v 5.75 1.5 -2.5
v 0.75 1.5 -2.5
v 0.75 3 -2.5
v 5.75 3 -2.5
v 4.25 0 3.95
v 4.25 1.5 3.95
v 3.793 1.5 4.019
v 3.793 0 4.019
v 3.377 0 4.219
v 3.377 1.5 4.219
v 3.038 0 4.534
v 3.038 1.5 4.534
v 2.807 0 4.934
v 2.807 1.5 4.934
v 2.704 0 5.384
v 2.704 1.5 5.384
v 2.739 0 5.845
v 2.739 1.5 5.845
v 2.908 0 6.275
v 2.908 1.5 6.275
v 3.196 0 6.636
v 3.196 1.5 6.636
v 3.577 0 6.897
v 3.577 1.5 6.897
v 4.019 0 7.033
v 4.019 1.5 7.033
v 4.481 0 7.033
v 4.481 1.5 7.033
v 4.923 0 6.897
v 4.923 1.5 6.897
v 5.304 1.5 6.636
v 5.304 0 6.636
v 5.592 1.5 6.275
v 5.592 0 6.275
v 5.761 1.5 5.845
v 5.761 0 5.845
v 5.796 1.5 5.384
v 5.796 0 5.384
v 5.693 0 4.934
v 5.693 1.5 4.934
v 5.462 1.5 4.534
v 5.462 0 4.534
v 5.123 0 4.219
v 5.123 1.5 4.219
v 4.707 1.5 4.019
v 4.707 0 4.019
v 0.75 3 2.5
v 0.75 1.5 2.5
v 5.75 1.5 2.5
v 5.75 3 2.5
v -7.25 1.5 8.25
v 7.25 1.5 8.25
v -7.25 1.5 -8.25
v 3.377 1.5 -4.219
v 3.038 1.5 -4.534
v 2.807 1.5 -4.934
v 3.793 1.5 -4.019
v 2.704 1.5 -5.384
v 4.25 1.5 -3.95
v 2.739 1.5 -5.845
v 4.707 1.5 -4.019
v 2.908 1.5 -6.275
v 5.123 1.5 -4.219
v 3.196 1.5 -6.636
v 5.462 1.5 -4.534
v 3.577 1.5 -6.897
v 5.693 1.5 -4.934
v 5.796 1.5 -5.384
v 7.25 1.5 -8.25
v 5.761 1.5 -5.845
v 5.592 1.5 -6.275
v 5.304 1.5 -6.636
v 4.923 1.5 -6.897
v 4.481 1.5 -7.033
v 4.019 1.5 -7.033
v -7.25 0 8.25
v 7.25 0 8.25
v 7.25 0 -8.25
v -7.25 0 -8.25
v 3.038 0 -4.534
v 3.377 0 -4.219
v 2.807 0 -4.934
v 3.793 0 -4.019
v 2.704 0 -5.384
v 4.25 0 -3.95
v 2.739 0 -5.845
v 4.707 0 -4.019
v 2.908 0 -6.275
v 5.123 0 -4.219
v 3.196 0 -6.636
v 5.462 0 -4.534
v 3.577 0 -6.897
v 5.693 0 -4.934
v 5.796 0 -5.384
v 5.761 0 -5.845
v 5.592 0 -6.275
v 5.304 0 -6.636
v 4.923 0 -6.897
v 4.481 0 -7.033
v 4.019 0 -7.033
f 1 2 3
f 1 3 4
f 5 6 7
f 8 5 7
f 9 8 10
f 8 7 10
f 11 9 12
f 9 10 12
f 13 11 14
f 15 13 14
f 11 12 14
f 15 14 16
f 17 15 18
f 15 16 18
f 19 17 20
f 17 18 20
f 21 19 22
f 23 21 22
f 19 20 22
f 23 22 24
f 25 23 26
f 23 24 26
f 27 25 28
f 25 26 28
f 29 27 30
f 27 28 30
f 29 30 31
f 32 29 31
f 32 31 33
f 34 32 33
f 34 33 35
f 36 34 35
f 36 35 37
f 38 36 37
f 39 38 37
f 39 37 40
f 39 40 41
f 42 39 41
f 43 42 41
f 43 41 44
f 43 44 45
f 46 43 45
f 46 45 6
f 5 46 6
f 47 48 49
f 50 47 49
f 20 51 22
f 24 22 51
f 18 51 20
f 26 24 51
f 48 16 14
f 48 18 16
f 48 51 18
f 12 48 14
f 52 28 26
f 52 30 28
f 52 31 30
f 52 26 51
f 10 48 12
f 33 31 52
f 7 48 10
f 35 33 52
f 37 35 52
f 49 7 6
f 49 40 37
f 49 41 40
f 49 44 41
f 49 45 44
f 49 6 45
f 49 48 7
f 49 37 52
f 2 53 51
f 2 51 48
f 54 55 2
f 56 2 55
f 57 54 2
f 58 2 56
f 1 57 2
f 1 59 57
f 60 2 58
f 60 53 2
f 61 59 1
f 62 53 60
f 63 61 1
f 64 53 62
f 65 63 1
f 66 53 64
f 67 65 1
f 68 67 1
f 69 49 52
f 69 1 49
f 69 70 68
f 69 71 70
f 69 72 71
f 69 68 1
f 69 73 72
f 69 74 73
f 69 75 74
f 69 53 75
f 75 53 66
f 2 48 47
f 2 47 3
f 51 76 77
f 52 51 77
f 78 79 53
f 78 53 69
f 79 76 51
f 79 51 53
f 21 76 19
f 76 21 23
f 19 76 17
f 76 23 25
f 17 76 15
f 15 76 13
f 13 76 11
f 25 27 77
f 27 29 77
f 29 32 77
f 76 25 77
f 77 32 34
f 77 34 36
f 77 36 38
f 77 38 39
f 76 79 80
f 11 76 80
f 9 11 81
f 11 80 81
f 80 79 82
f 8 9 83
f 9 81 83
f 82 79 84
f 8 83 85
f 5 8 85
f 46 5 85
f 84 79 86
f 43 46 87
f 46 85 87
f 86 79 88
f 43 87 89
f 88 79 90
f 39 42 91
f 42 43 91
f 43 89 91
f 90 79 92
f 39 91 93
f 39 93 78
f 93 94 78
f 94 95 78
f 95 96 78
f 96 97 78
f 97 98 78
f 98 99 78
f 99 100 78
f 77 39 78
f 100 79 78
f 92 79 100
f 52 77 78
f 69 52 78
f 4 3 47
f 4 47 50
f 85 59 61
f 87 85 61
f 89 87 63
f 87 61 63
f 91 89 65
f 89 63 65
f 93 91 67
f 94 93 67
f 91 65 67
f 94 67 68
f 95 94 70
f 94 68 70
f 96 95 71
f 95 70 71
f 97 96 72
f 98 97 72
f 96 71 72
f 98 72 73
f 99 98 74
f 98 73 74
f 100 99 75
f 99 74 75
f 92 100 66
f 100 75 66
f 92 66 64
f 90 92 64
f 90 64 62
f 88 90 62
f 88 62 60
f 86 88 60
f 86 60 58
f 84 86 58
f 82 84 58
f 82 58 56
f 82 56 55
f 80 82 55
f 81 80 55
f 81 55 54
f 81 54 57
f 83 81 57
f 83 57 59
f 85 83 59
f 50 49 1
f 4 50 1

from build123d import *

# Parameters (mm, degrees)
SKETCH1_W           = 14.5
SKETCH1_H           = 16.5
BOSS_EXTRUDE1_DEPTH = 1.5
SKETCH2_R           = 1.55
CUT_EXTRUDE1_DEPTH  = 12.084899639
SKETCH3_W           = 5
SKETCH3_H           = 5
BOSS_EXTRUDE2_DEPTH = 1.5


with BuildPart() as part:
    # Sketch1 → Boss-Extrude1 (new body)
    with BuildSketch(Plane(origin=(0, 0, 0), x_dir=(1, 0, 0), z_dir=(0, 1, 0))):
        Rectangle(SKETCH1_W, SKETCH1_H)
    extrude(amount=BOSS_EXTRUDE1_DEPTH)

    # Sketch2 → Cut-Extrude1 (cut, through all)
    with BuildSketch(Plane(origin=(0, 1.5, 0), x_dir=(1, 0, 0), z_dir=(0, 1, 0))):
        with Locations(Location((4.25, 5.5, 0), (0, 0, 270))):
            Circle(SKETCH2_R)
        with Locations(Location((4.25, -5.5, 0), (0, 0, 90))):
            Circle(SKETCH2_R)
    extrude(amount=-CUT_EXTRUDE1_DEPTH, mode=Mode.SUBTRACT)

    # Sketch3 → Boss-Extrude2 (add)
    with BuildSketch(Plane(origin=(0, 1.5, 0), x_dir=(1, 0, 0), z_dir=(0, 1, 0))):
        with Locations((3.25, 0)):
            Rectangle(SKETCH3_W, SKETCH3_H)
    extrude(amount=BOSS_EXTRUDE2_DEPTH)


solid = part.part
